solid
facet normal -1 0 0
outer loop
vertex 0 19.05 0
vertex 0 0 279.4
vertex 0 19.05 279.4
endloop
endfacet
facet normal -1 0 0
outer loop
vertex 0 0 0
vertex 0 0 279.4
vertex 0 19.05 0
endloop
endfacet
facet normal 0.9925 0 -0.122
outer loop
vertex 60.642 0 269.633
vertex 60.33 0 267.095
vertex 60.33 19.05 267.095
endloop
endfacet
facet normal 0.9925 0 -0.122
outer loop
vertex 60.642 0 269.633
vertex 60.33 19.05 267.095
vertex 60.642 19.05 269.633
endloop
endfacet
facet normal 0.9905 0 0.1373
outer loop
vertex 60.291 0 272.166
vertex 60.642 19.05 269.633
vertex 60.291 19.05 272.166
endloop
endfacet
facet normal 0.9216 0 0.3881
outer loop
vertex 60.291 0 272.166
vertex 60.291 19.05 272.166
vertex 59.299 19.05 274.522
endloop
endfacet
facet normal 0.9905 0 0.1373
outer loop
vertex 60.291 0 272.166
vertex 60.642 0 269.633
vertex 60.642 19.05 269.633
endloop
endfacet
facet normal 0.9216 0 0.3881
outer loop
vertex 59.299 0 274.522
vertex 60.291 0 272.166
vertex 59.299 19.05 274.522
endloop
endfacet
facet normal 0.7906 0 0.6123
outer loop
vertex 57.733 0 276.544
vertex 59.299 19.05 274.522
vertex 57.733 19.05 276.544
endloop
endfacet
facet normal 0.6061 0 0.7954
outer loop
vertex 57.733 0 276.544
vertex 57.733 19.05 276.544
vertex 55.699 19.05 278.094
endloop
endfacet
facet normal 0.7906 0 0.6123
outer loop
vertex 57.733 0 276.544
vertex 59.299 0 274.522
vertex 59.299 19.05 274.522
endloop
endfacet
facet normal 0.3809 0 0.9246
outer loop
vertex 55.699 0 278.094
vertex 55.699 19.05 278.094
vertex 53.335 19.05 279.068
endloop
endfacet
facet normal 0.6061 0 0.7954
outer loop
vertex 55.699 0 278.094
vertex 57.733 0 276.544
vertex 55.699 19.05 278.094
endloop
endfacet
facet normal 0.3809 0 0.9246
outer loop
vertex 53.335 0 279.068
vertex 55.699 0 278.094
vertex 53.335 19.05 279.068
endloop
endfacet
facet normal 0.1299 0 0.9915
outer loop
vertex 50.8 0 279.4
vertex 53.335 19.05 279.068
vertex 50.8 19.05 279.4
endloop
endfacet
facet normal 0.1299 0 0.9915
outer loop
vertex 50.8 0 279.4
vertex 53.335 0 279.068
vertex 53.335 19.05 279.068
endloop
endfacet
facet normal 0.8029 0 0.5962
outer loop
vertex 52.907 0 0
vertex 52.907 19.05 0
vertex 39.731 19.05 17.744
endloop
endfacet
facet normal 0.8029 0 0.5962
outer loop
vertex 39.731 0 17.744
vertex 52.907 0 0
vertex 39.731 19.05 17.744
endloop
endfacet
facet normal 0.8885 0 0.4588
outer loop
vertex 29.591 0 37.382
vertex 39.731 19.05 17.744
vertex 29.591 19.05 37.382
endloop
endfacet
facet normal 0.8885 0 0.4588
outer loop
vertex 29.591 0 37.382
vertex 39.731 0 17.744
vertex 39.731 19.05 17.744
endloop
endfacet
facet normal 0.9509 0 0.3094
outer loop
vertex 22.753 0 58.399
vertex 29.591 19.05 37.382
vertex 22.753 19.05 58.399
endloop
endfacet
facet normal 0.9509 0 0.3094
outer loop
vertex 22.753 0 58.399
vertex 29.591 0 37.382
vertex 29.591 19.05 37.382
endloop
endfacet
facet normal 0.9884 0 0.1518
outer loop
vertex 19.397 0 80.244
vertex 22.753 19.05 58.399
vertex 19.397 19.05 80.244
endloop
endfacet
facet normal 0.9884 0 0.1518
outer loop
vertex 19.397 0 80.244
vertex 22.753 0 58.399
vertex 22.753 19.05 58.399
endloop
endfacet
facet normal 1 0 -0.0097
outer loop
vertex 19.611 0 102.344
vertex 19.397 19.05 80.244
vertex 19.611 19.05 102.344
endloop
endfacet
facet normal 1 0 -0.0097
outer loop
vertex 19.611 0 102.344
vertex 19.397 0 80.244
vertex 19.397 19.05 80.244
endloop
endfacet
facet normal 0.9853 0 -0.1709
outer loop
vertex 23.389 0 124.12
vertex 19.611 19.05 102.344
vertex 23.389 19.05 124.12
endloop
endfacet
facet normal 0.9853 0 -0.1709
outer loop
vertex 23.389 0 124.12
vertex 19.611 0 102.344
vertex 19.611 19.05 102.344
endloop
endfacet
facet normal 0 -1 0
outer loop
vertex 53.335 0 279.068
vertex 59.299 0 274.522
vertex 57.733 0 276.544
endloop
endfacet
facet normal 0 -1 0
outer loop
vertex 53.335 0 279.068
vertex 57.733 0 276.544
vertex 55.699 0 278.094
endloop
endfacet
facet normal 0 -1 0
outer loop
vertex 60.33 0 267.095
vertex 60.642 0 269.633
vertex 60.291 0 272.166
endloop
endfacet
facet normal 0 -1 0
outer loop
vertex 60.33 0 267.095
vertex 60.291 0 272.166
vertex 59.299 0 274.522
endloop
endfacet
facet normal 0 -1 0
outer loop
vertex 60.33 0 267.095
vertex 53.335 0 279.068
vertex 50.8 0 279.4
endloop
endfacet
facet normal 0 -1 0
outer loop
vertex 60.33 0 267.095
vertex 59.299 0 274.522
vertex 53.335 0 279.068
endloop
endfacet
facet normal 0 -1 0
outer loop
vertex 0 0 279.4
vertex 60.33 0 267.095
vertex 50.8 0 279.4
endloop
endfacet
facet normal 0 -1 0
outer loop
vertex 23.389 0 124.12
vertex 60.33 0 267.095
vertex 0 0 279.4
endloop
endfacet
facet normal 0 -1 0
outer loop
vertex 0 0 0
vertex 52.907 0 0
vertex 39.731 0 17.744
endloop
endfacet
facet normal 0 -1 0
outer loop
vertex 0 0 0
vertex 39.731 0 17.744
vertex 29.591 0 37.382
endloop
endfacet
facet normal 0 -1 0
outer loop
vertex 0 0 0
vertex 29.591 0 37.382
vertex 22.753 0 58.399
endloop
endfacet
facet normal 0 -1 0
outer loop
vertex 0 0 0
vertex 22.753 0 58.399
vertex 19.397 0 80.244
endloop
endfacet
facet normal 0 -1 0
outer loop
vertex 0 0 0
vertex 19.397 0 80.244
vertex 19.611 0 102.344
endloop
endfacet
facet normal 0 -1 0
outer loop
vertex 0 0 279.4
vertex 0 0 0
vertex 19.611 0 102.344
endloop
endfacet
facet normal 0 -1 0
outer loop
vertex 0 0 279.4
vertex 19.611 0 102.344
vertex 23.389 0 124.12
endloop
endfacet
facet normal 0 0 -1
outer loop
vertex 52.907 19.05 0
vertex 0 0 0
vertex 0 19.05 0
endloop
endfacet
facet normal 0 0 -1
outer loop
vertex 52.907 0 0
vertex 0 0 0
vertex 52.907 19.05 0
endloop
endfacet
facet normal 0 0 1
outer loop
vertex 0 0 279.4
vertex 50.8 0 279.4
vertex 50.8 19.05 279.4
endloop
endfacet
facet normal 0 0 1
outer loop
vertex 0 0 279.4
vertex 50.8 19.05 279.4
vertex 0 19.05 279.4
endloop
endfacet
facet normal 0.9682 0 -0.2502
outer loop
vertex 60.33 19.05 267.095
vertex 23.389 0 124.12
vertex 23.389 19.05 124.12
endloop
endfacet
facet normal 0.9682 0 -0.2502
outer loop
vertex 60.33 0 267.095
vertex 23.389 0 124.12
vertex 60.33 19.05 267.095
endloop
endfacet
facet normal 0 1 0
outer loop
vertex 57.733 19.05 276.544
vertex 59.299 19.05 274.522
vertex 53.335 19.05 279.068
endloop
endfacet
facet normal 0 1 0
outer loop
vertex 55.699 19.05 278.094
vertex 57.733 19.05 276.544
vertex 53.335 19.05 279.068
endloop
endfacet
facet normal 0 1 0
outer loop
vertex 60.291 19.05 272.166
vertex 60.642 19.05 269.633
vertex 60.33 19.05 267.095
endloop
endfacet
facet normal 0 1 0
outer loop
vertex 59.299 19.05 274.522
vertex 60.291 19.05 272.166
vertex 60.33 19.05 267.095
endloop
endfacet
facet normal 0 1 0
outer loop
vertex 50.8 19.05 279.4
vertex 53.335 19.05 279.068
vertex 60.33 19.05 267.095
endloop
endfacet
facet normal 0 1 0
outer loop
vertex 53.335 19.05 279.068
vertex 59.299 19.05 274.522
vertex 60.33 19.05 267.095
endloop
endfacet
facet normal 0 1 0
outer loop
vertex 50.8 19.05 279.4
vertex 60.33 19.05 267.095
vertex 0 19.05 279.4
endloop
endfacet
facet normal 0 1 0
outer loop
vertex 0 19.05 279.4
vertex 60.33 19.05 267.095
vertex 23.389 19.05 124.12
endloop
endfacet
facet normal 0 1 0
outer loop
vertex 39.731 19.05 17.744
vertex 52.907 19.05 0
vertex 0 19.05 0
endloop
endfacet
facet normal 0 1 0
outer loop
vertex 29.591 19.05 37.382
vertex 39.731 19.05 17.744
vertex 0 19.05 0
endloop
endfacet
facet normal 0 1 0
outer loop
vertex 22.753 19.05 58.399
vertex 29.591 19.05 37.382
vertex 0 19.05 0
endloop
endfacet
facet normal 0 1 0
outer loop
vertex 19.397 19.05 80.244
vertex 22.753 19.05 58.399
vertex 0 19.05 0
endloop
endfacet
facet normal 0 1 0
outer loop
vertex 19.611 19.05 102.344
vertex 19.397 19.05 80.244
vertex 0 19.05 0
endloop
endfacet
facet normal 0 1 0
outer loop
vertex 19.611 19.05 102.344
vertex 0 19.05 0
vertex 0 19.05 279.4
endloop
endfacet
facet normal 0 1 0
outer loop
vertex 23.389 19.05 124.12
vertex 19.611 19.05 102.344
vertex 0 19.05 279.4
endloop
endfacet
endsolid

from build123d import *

# Parameters (mm, degrees)
BOSS_EXTRUDE1_DEPTH = 19.05


with BuildPart() as part:
    # Sketch1 → Boss-Extrude1 (new body)
    with BuildSketch(Plane(origin=(0, 0, 0), x_dir=(1, 0, 0), z_dir=(0, 1, 0))):
        with BuildLine():
            Line((50.8, -279.4), (0, -279.4))
            Line((0, -279.4), (0, 0))
            Line((0, 0), (52.907108287, 0))
            ThreePointArc((52.907108287, 0), (22.753262856, -58.398850563), (23.389451167, -124.120045058))
            Line((23.389451167, -124.120045058), (60.329571515, -267.095372264))
            ThreePointArc((60.329571515, -267.095372264), (58.58165466, -275.584162178), (50.8, -279.4))
        make_face()
    extrude(amount=BOSS_EXTRUDE1_DEPTH)


solid = part.part
